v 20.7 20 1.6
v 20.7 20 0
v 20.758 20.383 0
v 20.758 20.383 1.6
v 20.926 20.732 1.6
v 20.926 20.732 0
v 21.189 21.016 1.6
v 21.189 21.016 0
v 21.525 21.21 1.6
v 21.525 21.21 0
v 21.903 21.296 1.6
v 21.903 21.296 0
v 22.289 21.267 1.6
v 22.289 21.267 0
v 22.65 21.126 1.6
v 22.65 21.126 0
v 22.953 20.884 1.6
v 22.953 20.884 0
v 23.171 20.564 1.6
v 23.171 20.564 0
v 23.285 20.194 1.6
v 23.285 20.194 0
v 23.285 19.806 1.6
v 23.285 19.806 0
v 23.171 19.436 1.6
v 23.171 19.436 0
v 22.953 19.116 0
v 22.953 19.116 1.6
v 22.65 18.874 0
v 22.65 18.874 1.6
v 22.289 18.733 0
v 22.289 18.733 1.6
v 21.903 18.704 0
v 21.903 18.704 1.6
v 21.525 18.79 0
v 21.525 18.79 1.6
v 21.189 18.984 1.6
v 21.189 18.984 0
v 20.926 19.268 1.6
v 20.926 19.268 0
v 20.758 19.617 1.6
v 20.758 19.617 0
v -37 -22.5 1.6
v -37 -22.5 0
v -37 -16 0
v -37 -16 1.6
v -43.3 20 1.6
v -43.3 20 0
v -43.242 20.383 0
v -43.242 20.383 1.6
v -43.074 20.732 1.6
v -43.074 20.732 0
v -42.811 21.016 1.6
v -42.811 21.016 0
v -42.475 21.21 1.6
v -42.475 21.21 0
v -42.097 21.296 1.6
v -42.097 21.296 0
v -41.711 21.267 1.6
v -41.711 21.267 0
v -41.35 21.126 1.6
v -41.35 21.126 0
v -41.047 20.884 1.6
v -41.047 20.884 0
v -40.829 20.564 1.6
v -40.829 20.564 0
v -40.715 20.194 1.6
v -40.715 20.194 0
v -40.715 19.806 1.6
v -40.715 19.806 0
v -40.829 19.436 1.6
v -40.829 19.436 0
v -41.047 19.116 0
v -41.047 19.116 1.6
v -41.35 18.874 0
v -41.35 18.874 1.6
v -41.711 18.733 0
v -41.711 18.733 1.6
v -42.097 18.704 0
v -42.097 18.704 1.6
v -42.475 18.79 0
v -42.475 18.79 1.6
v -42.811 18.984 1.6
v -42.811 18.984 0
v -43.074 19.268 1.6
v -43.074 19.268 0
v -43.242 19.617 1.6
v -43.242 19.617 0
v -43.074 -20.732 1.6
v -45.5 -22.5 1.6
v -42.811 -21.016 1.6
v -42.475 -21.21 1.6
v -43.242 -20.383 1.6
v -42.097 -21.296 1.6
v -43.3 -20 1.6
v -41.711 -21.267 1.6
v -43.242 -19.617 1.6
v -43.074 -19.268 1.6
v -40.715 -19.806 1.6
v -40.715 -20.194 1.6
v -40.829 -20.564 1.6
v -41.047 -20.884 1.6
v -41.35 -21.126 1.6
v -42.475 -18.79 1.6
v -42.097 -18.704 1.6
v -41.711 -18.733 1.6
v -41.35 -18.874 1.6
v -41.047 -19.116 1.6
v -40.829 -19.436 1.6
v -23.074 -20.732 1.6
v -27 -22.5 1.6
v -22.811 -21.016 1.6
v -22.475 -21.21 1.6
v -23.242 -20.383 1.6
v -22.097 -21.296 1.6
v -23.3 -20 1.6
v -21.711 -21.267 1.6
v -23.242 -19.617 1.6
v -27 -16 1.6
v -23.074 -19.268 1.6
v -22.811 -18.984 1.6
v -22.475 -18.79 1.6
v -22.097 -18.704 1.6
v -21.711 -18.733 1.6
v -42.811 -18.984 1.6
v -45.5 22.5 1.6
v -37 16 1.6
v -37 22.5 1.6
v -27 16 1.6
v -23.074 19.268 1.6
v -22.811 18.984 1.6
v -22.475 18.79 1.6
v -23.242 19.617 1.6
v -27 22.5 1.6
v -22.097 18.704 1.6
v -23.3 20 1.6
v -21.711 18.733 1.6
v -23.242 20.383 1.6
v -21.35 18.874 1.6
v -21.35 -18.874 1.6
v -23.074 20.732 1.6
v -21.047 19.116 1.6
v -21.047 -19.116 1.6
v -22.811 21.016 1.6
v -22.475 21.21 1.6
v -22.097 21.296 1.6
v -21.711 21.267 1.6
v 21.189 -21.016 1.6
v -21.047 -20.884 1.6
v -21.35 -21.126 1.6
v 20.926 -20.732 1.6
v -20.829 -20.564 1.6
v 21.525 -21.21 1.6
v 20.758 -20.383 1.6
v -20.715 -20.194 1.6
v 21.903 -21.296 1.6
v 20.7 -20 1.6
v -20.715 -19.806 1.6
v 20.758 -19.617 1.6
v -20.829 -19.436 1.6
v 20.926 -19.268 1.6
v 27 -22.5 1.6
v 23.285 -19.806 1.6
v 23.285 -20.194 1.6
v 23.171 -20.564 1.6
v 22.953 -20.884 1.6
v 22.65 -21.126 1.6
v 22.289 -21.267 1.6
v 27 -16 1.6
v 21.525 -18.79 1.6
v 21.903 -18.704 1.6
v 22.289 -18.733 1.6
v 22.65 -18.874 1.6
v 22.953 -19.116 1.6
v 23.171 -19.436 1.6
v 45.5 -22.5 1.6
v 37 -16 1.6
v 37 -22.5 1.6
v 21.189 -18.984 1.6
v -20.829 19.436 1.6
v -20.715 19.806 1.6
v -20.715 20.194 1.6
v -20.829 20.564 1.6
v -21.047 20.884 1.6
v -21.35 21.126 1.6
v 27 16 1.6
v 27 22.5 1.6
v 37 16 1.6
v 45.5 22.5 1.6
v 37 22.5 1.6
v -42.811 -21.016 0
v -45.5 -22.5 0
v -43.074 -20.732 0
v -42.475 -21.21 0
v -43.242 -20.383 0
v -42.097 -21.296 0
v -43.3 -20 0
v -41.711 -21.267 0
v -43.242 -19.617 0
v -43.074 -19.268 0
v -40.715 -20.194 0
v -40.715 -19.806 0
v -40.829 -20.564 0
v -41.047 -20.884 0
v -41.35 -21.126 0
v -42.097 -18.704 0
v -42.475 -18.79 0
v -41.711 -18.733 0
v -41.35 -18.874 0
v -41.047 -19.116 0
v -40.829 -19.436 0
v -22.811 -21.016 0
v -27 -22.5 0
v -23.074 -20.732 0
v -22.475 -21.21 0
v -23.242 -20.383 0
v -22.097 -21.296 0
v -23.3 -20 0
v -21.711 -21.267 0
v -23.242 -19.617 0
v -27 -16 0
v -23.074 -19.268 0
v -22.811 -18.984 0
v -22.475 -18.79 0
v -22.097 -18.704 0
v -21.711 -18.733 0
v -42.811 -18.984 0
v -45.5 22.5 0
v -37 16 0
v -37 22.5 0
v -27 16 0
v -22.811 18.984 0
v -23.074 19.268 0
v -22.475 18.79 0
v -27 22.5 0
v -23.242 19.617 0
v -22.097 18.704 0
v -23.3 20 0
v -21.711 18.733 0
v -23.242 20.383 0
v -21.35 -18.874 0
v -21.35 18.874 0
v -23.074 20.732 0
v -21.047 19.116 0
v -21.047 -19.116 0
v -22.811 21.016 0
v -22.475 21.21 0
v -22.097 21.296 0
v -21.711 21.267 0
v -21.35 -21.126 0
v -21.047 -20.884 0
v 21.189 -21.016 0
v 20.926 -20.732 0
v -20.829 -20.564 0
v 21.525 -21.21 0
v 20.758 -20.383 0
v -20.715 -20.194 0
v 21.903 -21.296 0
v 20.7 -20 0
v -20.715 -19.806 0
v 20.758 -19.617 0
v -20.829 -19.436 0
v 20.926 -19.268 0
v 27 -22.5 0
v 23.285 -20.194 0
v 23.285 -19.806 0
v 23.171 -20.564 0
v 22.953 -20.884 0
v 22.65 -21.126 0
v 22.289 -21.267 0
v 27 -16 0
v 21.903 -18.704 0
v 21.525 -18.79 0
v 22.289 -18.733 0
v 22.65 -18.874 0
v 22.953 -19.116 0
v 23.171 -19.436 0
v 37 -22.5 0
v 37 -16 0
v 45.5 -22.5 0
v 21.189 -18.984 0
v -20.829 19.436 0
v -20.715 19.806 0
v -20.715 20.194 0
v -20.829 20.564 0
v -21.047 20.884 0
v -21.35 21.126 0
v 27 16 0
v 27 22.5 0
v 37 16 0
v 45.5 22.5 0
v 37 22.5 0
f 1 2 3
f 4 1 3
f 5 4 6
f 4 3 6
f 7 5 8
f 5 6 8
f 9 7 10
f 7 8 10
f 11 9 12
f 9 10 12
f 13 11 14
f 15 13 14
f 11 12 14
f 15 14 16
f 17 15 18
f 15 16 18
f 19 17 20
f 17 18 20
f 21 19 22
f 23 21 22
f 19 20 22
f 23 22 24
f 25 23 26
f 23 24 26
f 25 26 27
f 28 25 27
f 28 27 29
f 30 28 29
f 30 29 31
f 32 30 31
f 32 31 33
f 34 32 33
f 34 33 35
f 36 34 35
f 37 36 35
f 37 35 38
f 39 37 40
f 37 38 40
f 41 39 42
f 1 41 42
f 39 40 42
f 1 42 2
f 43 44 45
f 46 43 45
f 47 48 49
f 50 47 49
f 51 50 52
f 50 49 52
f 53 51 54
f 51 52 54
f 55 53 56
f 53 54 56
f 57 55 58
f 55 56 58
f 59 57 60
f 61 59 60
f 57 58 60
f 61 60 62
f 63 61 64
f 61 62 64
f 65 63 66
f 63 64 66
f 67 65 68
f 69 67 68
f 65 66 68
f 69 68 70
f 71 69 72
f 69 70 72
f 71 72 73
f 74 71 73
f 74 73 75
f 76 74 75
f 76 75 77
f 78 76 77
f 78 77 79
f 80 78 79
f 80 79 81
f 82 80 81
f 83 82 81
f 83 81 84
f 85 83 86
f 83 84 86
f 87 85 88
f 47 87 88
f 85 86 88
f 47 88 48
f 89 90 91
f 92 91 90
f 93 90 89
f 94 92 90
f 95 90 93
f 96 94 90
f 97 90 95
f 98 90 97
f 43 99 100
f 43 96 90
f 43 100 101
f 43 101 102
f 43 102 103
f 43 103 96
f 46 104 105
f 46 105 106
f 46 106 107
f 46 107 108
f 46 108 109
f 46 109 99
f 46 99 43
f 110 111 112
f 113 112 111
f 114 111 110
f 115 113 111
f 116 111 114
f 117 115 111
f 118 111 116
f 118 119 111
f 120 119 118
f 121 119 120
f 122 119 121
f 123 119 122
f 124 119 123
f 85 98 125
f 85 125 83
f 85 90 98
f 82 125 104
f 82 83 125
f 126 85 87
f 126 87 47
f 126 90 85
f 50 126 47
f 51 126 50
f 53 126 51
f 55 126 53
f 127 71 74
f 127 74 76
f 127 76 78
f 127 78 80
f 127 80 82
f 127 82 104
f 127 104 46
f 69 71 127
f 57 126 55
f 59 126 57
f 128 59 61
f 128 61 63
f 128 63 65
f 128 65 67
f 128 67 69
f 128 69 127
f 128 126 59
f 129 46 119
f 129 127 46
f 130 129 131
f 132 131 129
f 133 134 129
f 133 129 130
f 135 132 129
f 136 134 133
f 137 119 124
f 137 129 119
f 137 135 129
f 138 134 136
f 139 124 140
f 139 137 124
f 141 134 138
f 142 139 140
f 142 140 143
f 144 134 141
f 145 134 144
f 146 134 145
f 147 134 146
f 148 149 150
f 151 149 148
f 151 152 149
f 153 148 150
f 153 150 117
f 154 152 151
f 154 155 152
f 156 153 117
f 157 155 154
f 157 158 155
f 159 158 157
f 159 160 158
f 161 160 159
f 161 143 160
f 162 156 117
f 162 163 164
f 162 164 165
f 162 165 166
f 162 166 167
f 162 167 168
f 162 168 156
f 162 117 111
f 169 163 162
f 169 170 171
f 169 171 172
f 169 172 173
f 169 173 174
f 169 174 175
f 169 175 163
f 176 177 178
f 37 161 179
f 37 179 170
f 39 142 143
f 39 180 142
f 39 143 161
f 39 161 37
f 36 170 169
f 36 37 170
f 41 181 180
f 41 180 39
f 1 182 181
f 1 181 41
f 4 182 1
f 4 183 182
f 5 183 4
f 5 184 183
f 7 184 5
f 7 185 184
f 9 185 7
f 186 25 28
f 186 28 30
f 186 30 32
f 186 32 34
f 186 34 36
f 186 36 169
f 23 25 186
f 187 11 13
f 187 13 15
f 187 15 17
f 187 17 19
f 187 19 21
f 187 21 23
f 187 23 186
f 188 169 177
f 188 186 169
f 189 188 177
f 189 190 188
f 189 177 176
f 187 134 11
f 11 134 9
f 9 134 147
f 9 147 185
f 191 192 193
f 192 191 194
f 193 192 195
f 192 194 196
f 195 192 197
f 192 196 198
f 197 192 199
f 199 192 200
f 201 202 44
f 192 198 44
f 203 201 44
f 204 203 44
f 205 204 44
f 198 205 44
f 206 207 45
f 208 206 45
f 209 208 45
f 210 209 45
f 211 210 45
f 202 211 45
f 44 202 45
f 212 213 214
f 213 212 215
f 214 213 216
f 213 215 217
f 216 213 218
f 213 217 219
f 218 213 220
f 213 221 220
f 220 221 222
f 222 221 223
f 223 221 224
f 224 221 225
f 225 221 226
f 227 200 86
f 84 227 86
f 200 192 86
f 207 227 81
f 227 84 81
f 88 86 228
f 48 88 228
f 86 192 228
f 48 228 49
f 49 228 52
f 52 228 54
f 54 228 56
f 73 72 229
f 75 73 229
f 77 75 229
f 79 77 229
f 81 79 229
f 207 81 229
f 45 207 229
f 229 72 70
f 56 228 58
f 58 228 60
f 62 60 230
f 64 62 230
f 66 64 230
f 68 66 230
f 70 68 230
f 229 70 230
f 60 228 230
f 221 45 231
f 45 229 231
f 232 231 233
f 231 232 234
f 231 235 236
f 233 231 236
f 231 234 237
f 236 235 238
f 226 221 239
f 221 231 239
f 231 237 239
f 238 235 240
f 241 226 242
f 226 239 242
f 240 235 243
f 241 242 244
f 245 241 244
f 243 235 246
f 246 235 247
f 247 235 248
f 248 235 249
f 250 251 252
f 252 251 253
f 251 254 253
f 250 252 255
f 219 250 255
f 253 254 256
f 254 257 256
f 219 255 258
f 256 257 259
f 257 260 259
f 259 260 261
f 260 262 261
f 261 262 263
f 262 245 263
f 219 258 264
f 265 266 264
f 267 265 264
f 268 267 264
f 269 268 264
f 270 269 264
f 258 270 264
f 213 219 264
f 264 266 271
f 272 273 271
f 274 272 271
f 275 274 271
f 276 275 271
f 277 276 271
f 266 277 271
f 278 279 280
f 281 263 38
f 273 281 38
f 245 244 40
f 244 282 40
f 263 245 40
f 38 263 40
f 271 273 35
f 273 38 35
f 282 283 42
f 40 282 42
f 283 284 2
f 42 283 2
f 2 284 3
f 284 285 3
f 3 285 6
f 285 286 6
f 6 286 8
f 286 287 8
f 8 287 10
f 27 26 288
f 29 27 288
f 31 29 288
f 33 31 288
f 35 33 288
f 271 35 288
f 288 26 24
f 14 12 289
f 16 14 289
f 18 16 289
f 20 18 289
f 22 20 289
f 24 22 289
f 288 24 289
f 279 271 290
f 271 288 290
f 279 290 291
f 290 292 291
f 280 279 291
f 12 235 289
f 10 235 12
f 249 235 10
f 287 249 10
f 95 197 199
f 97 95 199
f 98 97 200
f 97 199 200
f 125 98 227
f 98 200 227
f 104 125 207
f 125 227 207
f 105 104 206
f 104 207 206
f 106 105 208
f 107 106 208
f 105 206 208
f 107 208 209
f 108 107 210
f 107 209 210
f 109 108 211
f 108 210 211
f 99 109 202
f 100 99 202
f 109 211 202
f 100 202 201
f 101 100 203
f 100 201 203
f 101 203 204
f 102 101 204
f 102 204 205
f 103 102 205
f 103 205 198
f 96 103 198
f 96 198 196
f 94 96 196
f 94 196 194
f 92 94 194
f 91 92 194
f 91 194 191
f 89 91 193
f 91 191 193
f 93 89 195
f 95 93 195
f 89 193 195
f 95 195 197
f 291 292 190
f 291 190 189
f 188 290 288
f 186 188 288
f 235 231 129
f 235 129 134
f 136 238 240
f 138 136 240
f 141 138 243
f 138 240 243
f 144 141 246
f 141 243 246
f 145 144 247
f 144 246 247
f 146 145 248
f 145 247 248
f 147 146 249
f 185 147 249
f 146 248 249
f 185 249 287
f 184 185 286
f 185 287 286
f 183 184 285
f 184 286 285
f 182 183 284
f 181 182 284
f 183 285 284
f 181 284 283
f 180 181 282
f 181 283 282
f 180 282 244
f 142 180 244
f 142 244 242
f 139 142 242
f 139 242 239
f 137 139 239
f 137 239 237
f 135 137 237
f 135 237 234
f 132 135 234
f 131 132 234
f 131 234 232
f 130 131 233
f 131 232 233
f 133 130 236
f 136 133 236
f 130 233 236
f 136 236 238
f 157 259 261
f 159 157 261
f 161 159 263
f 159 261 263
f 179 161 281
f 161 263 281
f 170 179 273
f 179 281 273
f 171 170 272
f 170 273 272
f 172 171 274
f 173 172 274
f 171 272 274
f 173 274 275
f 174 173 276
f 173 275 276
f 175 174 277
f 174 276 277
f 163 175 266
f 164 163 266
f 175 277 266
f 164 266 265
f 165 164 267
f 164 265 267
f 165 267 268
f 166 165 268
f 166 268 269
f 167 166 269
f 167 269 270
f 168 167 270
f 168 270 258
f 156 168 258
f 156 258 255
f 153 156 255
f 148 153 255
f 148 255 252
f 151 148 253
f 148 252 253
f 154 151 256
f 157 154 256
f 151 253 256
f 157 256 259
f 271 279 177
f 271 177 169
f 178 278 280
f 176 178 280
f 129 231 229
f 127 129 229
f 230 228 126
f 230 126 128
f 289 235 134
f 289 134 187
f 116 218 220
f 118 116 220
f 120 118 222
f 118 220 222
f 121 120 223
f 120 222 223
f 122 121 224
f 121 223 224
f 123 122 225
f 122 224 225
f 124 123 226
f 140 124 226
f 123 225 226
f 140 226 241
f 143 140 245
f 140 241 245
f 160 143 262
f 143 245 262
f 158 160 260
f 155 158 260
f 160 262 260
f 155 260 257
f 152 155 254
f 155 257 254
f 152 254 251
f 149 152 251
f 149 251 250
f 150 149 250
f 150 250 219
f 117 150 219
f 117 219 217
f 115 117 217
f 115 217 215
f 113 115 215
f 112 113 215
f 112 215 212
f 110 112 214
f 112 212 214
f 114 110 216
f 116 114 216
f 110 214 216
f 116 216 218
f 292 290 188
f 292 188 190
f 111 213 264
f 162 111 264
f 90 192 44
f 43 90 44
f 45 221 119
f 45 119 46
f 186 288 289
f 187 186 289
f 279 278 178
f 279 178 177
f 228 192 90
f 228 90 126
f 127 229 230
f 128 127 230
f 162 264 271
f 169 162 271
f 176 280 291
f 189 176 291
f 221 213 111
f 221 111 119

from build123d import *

# Parameters (mm, degrees)
SKETCH_1_W          = 91
SKETCH_1_H          = 45
EXTRUDE_1_DEPTH     = 1.6
SKETCH_2_R          = 1.3
CUT_EXTRUDE_1_DEPTH = 1.6
SKETCH_5_W          = 10
SKETCH_5_H          = 6.5
CUT_EXTRUDE_2_DEPTH = 1.6


with BuildPart() as part:
    # Эскиз1 → Бобышка-Вытянуть1 (new body)
    with BuildSketch(Plane.XY):
        Rectangle(SKETCH_1_W, SKETCH_1_H)
    extrude(amount=EXTRUDE_1_DEPTH)

    # Эскиз2 → Вырез-Вытянуть1 (cut)
    with BuildSketch(Plane(origin=(0, 0, 0), x_dir=(-1, 0, 0), z_dir=(0, 0, -1))):
        with Locations((22, 20)):
            Circle(SKETCH_2_R)
        with Locations((-22, 20)):
            Circle(SKETCH_2_R)
        with Locations((42, 20)):
            Circle(SKETCH_2_R)
        with Locations((42, -20)):
            Circle(SKETCH_2_R)
        with Locations((22, -20)):
            Circle(SKETCH_2_R)
        with Locations((-22, -20)):
            Circle(SKETCH_2_R)
    extrude(amount=-CUT_EXTRUDE_1_DEPTH, mode=Mode.SUBTRACT)

    # Эскиз5 → Вырез-Вытянуть2 (cut)
    with BuildSketch(Plane(origin=(0, 0, 0), x_dir=(-1, 0, 0), z_dir=(0, 0, -1))):
        with Locations((-32, 19.25)):
            Rectangle(SKETCH_5_W, SKETCH_5_H)
        with Locations((32, 19.25)):
            Rectangle(SKETCH_5_W, SKETCH_5_H)
        with Locations((32, -19.25)):
            Rectangle(SKETCH_5_W, SKETCH_5_H)
        with Locations((-32, -19.25)):
            Rectangle(SKETCH_5_W, SKETCH_5_H)
    extrude(amount=-CUT_EXTRUDE_2_DEPTH, mode=Mode.SUBTRACT)


solid = part.part
